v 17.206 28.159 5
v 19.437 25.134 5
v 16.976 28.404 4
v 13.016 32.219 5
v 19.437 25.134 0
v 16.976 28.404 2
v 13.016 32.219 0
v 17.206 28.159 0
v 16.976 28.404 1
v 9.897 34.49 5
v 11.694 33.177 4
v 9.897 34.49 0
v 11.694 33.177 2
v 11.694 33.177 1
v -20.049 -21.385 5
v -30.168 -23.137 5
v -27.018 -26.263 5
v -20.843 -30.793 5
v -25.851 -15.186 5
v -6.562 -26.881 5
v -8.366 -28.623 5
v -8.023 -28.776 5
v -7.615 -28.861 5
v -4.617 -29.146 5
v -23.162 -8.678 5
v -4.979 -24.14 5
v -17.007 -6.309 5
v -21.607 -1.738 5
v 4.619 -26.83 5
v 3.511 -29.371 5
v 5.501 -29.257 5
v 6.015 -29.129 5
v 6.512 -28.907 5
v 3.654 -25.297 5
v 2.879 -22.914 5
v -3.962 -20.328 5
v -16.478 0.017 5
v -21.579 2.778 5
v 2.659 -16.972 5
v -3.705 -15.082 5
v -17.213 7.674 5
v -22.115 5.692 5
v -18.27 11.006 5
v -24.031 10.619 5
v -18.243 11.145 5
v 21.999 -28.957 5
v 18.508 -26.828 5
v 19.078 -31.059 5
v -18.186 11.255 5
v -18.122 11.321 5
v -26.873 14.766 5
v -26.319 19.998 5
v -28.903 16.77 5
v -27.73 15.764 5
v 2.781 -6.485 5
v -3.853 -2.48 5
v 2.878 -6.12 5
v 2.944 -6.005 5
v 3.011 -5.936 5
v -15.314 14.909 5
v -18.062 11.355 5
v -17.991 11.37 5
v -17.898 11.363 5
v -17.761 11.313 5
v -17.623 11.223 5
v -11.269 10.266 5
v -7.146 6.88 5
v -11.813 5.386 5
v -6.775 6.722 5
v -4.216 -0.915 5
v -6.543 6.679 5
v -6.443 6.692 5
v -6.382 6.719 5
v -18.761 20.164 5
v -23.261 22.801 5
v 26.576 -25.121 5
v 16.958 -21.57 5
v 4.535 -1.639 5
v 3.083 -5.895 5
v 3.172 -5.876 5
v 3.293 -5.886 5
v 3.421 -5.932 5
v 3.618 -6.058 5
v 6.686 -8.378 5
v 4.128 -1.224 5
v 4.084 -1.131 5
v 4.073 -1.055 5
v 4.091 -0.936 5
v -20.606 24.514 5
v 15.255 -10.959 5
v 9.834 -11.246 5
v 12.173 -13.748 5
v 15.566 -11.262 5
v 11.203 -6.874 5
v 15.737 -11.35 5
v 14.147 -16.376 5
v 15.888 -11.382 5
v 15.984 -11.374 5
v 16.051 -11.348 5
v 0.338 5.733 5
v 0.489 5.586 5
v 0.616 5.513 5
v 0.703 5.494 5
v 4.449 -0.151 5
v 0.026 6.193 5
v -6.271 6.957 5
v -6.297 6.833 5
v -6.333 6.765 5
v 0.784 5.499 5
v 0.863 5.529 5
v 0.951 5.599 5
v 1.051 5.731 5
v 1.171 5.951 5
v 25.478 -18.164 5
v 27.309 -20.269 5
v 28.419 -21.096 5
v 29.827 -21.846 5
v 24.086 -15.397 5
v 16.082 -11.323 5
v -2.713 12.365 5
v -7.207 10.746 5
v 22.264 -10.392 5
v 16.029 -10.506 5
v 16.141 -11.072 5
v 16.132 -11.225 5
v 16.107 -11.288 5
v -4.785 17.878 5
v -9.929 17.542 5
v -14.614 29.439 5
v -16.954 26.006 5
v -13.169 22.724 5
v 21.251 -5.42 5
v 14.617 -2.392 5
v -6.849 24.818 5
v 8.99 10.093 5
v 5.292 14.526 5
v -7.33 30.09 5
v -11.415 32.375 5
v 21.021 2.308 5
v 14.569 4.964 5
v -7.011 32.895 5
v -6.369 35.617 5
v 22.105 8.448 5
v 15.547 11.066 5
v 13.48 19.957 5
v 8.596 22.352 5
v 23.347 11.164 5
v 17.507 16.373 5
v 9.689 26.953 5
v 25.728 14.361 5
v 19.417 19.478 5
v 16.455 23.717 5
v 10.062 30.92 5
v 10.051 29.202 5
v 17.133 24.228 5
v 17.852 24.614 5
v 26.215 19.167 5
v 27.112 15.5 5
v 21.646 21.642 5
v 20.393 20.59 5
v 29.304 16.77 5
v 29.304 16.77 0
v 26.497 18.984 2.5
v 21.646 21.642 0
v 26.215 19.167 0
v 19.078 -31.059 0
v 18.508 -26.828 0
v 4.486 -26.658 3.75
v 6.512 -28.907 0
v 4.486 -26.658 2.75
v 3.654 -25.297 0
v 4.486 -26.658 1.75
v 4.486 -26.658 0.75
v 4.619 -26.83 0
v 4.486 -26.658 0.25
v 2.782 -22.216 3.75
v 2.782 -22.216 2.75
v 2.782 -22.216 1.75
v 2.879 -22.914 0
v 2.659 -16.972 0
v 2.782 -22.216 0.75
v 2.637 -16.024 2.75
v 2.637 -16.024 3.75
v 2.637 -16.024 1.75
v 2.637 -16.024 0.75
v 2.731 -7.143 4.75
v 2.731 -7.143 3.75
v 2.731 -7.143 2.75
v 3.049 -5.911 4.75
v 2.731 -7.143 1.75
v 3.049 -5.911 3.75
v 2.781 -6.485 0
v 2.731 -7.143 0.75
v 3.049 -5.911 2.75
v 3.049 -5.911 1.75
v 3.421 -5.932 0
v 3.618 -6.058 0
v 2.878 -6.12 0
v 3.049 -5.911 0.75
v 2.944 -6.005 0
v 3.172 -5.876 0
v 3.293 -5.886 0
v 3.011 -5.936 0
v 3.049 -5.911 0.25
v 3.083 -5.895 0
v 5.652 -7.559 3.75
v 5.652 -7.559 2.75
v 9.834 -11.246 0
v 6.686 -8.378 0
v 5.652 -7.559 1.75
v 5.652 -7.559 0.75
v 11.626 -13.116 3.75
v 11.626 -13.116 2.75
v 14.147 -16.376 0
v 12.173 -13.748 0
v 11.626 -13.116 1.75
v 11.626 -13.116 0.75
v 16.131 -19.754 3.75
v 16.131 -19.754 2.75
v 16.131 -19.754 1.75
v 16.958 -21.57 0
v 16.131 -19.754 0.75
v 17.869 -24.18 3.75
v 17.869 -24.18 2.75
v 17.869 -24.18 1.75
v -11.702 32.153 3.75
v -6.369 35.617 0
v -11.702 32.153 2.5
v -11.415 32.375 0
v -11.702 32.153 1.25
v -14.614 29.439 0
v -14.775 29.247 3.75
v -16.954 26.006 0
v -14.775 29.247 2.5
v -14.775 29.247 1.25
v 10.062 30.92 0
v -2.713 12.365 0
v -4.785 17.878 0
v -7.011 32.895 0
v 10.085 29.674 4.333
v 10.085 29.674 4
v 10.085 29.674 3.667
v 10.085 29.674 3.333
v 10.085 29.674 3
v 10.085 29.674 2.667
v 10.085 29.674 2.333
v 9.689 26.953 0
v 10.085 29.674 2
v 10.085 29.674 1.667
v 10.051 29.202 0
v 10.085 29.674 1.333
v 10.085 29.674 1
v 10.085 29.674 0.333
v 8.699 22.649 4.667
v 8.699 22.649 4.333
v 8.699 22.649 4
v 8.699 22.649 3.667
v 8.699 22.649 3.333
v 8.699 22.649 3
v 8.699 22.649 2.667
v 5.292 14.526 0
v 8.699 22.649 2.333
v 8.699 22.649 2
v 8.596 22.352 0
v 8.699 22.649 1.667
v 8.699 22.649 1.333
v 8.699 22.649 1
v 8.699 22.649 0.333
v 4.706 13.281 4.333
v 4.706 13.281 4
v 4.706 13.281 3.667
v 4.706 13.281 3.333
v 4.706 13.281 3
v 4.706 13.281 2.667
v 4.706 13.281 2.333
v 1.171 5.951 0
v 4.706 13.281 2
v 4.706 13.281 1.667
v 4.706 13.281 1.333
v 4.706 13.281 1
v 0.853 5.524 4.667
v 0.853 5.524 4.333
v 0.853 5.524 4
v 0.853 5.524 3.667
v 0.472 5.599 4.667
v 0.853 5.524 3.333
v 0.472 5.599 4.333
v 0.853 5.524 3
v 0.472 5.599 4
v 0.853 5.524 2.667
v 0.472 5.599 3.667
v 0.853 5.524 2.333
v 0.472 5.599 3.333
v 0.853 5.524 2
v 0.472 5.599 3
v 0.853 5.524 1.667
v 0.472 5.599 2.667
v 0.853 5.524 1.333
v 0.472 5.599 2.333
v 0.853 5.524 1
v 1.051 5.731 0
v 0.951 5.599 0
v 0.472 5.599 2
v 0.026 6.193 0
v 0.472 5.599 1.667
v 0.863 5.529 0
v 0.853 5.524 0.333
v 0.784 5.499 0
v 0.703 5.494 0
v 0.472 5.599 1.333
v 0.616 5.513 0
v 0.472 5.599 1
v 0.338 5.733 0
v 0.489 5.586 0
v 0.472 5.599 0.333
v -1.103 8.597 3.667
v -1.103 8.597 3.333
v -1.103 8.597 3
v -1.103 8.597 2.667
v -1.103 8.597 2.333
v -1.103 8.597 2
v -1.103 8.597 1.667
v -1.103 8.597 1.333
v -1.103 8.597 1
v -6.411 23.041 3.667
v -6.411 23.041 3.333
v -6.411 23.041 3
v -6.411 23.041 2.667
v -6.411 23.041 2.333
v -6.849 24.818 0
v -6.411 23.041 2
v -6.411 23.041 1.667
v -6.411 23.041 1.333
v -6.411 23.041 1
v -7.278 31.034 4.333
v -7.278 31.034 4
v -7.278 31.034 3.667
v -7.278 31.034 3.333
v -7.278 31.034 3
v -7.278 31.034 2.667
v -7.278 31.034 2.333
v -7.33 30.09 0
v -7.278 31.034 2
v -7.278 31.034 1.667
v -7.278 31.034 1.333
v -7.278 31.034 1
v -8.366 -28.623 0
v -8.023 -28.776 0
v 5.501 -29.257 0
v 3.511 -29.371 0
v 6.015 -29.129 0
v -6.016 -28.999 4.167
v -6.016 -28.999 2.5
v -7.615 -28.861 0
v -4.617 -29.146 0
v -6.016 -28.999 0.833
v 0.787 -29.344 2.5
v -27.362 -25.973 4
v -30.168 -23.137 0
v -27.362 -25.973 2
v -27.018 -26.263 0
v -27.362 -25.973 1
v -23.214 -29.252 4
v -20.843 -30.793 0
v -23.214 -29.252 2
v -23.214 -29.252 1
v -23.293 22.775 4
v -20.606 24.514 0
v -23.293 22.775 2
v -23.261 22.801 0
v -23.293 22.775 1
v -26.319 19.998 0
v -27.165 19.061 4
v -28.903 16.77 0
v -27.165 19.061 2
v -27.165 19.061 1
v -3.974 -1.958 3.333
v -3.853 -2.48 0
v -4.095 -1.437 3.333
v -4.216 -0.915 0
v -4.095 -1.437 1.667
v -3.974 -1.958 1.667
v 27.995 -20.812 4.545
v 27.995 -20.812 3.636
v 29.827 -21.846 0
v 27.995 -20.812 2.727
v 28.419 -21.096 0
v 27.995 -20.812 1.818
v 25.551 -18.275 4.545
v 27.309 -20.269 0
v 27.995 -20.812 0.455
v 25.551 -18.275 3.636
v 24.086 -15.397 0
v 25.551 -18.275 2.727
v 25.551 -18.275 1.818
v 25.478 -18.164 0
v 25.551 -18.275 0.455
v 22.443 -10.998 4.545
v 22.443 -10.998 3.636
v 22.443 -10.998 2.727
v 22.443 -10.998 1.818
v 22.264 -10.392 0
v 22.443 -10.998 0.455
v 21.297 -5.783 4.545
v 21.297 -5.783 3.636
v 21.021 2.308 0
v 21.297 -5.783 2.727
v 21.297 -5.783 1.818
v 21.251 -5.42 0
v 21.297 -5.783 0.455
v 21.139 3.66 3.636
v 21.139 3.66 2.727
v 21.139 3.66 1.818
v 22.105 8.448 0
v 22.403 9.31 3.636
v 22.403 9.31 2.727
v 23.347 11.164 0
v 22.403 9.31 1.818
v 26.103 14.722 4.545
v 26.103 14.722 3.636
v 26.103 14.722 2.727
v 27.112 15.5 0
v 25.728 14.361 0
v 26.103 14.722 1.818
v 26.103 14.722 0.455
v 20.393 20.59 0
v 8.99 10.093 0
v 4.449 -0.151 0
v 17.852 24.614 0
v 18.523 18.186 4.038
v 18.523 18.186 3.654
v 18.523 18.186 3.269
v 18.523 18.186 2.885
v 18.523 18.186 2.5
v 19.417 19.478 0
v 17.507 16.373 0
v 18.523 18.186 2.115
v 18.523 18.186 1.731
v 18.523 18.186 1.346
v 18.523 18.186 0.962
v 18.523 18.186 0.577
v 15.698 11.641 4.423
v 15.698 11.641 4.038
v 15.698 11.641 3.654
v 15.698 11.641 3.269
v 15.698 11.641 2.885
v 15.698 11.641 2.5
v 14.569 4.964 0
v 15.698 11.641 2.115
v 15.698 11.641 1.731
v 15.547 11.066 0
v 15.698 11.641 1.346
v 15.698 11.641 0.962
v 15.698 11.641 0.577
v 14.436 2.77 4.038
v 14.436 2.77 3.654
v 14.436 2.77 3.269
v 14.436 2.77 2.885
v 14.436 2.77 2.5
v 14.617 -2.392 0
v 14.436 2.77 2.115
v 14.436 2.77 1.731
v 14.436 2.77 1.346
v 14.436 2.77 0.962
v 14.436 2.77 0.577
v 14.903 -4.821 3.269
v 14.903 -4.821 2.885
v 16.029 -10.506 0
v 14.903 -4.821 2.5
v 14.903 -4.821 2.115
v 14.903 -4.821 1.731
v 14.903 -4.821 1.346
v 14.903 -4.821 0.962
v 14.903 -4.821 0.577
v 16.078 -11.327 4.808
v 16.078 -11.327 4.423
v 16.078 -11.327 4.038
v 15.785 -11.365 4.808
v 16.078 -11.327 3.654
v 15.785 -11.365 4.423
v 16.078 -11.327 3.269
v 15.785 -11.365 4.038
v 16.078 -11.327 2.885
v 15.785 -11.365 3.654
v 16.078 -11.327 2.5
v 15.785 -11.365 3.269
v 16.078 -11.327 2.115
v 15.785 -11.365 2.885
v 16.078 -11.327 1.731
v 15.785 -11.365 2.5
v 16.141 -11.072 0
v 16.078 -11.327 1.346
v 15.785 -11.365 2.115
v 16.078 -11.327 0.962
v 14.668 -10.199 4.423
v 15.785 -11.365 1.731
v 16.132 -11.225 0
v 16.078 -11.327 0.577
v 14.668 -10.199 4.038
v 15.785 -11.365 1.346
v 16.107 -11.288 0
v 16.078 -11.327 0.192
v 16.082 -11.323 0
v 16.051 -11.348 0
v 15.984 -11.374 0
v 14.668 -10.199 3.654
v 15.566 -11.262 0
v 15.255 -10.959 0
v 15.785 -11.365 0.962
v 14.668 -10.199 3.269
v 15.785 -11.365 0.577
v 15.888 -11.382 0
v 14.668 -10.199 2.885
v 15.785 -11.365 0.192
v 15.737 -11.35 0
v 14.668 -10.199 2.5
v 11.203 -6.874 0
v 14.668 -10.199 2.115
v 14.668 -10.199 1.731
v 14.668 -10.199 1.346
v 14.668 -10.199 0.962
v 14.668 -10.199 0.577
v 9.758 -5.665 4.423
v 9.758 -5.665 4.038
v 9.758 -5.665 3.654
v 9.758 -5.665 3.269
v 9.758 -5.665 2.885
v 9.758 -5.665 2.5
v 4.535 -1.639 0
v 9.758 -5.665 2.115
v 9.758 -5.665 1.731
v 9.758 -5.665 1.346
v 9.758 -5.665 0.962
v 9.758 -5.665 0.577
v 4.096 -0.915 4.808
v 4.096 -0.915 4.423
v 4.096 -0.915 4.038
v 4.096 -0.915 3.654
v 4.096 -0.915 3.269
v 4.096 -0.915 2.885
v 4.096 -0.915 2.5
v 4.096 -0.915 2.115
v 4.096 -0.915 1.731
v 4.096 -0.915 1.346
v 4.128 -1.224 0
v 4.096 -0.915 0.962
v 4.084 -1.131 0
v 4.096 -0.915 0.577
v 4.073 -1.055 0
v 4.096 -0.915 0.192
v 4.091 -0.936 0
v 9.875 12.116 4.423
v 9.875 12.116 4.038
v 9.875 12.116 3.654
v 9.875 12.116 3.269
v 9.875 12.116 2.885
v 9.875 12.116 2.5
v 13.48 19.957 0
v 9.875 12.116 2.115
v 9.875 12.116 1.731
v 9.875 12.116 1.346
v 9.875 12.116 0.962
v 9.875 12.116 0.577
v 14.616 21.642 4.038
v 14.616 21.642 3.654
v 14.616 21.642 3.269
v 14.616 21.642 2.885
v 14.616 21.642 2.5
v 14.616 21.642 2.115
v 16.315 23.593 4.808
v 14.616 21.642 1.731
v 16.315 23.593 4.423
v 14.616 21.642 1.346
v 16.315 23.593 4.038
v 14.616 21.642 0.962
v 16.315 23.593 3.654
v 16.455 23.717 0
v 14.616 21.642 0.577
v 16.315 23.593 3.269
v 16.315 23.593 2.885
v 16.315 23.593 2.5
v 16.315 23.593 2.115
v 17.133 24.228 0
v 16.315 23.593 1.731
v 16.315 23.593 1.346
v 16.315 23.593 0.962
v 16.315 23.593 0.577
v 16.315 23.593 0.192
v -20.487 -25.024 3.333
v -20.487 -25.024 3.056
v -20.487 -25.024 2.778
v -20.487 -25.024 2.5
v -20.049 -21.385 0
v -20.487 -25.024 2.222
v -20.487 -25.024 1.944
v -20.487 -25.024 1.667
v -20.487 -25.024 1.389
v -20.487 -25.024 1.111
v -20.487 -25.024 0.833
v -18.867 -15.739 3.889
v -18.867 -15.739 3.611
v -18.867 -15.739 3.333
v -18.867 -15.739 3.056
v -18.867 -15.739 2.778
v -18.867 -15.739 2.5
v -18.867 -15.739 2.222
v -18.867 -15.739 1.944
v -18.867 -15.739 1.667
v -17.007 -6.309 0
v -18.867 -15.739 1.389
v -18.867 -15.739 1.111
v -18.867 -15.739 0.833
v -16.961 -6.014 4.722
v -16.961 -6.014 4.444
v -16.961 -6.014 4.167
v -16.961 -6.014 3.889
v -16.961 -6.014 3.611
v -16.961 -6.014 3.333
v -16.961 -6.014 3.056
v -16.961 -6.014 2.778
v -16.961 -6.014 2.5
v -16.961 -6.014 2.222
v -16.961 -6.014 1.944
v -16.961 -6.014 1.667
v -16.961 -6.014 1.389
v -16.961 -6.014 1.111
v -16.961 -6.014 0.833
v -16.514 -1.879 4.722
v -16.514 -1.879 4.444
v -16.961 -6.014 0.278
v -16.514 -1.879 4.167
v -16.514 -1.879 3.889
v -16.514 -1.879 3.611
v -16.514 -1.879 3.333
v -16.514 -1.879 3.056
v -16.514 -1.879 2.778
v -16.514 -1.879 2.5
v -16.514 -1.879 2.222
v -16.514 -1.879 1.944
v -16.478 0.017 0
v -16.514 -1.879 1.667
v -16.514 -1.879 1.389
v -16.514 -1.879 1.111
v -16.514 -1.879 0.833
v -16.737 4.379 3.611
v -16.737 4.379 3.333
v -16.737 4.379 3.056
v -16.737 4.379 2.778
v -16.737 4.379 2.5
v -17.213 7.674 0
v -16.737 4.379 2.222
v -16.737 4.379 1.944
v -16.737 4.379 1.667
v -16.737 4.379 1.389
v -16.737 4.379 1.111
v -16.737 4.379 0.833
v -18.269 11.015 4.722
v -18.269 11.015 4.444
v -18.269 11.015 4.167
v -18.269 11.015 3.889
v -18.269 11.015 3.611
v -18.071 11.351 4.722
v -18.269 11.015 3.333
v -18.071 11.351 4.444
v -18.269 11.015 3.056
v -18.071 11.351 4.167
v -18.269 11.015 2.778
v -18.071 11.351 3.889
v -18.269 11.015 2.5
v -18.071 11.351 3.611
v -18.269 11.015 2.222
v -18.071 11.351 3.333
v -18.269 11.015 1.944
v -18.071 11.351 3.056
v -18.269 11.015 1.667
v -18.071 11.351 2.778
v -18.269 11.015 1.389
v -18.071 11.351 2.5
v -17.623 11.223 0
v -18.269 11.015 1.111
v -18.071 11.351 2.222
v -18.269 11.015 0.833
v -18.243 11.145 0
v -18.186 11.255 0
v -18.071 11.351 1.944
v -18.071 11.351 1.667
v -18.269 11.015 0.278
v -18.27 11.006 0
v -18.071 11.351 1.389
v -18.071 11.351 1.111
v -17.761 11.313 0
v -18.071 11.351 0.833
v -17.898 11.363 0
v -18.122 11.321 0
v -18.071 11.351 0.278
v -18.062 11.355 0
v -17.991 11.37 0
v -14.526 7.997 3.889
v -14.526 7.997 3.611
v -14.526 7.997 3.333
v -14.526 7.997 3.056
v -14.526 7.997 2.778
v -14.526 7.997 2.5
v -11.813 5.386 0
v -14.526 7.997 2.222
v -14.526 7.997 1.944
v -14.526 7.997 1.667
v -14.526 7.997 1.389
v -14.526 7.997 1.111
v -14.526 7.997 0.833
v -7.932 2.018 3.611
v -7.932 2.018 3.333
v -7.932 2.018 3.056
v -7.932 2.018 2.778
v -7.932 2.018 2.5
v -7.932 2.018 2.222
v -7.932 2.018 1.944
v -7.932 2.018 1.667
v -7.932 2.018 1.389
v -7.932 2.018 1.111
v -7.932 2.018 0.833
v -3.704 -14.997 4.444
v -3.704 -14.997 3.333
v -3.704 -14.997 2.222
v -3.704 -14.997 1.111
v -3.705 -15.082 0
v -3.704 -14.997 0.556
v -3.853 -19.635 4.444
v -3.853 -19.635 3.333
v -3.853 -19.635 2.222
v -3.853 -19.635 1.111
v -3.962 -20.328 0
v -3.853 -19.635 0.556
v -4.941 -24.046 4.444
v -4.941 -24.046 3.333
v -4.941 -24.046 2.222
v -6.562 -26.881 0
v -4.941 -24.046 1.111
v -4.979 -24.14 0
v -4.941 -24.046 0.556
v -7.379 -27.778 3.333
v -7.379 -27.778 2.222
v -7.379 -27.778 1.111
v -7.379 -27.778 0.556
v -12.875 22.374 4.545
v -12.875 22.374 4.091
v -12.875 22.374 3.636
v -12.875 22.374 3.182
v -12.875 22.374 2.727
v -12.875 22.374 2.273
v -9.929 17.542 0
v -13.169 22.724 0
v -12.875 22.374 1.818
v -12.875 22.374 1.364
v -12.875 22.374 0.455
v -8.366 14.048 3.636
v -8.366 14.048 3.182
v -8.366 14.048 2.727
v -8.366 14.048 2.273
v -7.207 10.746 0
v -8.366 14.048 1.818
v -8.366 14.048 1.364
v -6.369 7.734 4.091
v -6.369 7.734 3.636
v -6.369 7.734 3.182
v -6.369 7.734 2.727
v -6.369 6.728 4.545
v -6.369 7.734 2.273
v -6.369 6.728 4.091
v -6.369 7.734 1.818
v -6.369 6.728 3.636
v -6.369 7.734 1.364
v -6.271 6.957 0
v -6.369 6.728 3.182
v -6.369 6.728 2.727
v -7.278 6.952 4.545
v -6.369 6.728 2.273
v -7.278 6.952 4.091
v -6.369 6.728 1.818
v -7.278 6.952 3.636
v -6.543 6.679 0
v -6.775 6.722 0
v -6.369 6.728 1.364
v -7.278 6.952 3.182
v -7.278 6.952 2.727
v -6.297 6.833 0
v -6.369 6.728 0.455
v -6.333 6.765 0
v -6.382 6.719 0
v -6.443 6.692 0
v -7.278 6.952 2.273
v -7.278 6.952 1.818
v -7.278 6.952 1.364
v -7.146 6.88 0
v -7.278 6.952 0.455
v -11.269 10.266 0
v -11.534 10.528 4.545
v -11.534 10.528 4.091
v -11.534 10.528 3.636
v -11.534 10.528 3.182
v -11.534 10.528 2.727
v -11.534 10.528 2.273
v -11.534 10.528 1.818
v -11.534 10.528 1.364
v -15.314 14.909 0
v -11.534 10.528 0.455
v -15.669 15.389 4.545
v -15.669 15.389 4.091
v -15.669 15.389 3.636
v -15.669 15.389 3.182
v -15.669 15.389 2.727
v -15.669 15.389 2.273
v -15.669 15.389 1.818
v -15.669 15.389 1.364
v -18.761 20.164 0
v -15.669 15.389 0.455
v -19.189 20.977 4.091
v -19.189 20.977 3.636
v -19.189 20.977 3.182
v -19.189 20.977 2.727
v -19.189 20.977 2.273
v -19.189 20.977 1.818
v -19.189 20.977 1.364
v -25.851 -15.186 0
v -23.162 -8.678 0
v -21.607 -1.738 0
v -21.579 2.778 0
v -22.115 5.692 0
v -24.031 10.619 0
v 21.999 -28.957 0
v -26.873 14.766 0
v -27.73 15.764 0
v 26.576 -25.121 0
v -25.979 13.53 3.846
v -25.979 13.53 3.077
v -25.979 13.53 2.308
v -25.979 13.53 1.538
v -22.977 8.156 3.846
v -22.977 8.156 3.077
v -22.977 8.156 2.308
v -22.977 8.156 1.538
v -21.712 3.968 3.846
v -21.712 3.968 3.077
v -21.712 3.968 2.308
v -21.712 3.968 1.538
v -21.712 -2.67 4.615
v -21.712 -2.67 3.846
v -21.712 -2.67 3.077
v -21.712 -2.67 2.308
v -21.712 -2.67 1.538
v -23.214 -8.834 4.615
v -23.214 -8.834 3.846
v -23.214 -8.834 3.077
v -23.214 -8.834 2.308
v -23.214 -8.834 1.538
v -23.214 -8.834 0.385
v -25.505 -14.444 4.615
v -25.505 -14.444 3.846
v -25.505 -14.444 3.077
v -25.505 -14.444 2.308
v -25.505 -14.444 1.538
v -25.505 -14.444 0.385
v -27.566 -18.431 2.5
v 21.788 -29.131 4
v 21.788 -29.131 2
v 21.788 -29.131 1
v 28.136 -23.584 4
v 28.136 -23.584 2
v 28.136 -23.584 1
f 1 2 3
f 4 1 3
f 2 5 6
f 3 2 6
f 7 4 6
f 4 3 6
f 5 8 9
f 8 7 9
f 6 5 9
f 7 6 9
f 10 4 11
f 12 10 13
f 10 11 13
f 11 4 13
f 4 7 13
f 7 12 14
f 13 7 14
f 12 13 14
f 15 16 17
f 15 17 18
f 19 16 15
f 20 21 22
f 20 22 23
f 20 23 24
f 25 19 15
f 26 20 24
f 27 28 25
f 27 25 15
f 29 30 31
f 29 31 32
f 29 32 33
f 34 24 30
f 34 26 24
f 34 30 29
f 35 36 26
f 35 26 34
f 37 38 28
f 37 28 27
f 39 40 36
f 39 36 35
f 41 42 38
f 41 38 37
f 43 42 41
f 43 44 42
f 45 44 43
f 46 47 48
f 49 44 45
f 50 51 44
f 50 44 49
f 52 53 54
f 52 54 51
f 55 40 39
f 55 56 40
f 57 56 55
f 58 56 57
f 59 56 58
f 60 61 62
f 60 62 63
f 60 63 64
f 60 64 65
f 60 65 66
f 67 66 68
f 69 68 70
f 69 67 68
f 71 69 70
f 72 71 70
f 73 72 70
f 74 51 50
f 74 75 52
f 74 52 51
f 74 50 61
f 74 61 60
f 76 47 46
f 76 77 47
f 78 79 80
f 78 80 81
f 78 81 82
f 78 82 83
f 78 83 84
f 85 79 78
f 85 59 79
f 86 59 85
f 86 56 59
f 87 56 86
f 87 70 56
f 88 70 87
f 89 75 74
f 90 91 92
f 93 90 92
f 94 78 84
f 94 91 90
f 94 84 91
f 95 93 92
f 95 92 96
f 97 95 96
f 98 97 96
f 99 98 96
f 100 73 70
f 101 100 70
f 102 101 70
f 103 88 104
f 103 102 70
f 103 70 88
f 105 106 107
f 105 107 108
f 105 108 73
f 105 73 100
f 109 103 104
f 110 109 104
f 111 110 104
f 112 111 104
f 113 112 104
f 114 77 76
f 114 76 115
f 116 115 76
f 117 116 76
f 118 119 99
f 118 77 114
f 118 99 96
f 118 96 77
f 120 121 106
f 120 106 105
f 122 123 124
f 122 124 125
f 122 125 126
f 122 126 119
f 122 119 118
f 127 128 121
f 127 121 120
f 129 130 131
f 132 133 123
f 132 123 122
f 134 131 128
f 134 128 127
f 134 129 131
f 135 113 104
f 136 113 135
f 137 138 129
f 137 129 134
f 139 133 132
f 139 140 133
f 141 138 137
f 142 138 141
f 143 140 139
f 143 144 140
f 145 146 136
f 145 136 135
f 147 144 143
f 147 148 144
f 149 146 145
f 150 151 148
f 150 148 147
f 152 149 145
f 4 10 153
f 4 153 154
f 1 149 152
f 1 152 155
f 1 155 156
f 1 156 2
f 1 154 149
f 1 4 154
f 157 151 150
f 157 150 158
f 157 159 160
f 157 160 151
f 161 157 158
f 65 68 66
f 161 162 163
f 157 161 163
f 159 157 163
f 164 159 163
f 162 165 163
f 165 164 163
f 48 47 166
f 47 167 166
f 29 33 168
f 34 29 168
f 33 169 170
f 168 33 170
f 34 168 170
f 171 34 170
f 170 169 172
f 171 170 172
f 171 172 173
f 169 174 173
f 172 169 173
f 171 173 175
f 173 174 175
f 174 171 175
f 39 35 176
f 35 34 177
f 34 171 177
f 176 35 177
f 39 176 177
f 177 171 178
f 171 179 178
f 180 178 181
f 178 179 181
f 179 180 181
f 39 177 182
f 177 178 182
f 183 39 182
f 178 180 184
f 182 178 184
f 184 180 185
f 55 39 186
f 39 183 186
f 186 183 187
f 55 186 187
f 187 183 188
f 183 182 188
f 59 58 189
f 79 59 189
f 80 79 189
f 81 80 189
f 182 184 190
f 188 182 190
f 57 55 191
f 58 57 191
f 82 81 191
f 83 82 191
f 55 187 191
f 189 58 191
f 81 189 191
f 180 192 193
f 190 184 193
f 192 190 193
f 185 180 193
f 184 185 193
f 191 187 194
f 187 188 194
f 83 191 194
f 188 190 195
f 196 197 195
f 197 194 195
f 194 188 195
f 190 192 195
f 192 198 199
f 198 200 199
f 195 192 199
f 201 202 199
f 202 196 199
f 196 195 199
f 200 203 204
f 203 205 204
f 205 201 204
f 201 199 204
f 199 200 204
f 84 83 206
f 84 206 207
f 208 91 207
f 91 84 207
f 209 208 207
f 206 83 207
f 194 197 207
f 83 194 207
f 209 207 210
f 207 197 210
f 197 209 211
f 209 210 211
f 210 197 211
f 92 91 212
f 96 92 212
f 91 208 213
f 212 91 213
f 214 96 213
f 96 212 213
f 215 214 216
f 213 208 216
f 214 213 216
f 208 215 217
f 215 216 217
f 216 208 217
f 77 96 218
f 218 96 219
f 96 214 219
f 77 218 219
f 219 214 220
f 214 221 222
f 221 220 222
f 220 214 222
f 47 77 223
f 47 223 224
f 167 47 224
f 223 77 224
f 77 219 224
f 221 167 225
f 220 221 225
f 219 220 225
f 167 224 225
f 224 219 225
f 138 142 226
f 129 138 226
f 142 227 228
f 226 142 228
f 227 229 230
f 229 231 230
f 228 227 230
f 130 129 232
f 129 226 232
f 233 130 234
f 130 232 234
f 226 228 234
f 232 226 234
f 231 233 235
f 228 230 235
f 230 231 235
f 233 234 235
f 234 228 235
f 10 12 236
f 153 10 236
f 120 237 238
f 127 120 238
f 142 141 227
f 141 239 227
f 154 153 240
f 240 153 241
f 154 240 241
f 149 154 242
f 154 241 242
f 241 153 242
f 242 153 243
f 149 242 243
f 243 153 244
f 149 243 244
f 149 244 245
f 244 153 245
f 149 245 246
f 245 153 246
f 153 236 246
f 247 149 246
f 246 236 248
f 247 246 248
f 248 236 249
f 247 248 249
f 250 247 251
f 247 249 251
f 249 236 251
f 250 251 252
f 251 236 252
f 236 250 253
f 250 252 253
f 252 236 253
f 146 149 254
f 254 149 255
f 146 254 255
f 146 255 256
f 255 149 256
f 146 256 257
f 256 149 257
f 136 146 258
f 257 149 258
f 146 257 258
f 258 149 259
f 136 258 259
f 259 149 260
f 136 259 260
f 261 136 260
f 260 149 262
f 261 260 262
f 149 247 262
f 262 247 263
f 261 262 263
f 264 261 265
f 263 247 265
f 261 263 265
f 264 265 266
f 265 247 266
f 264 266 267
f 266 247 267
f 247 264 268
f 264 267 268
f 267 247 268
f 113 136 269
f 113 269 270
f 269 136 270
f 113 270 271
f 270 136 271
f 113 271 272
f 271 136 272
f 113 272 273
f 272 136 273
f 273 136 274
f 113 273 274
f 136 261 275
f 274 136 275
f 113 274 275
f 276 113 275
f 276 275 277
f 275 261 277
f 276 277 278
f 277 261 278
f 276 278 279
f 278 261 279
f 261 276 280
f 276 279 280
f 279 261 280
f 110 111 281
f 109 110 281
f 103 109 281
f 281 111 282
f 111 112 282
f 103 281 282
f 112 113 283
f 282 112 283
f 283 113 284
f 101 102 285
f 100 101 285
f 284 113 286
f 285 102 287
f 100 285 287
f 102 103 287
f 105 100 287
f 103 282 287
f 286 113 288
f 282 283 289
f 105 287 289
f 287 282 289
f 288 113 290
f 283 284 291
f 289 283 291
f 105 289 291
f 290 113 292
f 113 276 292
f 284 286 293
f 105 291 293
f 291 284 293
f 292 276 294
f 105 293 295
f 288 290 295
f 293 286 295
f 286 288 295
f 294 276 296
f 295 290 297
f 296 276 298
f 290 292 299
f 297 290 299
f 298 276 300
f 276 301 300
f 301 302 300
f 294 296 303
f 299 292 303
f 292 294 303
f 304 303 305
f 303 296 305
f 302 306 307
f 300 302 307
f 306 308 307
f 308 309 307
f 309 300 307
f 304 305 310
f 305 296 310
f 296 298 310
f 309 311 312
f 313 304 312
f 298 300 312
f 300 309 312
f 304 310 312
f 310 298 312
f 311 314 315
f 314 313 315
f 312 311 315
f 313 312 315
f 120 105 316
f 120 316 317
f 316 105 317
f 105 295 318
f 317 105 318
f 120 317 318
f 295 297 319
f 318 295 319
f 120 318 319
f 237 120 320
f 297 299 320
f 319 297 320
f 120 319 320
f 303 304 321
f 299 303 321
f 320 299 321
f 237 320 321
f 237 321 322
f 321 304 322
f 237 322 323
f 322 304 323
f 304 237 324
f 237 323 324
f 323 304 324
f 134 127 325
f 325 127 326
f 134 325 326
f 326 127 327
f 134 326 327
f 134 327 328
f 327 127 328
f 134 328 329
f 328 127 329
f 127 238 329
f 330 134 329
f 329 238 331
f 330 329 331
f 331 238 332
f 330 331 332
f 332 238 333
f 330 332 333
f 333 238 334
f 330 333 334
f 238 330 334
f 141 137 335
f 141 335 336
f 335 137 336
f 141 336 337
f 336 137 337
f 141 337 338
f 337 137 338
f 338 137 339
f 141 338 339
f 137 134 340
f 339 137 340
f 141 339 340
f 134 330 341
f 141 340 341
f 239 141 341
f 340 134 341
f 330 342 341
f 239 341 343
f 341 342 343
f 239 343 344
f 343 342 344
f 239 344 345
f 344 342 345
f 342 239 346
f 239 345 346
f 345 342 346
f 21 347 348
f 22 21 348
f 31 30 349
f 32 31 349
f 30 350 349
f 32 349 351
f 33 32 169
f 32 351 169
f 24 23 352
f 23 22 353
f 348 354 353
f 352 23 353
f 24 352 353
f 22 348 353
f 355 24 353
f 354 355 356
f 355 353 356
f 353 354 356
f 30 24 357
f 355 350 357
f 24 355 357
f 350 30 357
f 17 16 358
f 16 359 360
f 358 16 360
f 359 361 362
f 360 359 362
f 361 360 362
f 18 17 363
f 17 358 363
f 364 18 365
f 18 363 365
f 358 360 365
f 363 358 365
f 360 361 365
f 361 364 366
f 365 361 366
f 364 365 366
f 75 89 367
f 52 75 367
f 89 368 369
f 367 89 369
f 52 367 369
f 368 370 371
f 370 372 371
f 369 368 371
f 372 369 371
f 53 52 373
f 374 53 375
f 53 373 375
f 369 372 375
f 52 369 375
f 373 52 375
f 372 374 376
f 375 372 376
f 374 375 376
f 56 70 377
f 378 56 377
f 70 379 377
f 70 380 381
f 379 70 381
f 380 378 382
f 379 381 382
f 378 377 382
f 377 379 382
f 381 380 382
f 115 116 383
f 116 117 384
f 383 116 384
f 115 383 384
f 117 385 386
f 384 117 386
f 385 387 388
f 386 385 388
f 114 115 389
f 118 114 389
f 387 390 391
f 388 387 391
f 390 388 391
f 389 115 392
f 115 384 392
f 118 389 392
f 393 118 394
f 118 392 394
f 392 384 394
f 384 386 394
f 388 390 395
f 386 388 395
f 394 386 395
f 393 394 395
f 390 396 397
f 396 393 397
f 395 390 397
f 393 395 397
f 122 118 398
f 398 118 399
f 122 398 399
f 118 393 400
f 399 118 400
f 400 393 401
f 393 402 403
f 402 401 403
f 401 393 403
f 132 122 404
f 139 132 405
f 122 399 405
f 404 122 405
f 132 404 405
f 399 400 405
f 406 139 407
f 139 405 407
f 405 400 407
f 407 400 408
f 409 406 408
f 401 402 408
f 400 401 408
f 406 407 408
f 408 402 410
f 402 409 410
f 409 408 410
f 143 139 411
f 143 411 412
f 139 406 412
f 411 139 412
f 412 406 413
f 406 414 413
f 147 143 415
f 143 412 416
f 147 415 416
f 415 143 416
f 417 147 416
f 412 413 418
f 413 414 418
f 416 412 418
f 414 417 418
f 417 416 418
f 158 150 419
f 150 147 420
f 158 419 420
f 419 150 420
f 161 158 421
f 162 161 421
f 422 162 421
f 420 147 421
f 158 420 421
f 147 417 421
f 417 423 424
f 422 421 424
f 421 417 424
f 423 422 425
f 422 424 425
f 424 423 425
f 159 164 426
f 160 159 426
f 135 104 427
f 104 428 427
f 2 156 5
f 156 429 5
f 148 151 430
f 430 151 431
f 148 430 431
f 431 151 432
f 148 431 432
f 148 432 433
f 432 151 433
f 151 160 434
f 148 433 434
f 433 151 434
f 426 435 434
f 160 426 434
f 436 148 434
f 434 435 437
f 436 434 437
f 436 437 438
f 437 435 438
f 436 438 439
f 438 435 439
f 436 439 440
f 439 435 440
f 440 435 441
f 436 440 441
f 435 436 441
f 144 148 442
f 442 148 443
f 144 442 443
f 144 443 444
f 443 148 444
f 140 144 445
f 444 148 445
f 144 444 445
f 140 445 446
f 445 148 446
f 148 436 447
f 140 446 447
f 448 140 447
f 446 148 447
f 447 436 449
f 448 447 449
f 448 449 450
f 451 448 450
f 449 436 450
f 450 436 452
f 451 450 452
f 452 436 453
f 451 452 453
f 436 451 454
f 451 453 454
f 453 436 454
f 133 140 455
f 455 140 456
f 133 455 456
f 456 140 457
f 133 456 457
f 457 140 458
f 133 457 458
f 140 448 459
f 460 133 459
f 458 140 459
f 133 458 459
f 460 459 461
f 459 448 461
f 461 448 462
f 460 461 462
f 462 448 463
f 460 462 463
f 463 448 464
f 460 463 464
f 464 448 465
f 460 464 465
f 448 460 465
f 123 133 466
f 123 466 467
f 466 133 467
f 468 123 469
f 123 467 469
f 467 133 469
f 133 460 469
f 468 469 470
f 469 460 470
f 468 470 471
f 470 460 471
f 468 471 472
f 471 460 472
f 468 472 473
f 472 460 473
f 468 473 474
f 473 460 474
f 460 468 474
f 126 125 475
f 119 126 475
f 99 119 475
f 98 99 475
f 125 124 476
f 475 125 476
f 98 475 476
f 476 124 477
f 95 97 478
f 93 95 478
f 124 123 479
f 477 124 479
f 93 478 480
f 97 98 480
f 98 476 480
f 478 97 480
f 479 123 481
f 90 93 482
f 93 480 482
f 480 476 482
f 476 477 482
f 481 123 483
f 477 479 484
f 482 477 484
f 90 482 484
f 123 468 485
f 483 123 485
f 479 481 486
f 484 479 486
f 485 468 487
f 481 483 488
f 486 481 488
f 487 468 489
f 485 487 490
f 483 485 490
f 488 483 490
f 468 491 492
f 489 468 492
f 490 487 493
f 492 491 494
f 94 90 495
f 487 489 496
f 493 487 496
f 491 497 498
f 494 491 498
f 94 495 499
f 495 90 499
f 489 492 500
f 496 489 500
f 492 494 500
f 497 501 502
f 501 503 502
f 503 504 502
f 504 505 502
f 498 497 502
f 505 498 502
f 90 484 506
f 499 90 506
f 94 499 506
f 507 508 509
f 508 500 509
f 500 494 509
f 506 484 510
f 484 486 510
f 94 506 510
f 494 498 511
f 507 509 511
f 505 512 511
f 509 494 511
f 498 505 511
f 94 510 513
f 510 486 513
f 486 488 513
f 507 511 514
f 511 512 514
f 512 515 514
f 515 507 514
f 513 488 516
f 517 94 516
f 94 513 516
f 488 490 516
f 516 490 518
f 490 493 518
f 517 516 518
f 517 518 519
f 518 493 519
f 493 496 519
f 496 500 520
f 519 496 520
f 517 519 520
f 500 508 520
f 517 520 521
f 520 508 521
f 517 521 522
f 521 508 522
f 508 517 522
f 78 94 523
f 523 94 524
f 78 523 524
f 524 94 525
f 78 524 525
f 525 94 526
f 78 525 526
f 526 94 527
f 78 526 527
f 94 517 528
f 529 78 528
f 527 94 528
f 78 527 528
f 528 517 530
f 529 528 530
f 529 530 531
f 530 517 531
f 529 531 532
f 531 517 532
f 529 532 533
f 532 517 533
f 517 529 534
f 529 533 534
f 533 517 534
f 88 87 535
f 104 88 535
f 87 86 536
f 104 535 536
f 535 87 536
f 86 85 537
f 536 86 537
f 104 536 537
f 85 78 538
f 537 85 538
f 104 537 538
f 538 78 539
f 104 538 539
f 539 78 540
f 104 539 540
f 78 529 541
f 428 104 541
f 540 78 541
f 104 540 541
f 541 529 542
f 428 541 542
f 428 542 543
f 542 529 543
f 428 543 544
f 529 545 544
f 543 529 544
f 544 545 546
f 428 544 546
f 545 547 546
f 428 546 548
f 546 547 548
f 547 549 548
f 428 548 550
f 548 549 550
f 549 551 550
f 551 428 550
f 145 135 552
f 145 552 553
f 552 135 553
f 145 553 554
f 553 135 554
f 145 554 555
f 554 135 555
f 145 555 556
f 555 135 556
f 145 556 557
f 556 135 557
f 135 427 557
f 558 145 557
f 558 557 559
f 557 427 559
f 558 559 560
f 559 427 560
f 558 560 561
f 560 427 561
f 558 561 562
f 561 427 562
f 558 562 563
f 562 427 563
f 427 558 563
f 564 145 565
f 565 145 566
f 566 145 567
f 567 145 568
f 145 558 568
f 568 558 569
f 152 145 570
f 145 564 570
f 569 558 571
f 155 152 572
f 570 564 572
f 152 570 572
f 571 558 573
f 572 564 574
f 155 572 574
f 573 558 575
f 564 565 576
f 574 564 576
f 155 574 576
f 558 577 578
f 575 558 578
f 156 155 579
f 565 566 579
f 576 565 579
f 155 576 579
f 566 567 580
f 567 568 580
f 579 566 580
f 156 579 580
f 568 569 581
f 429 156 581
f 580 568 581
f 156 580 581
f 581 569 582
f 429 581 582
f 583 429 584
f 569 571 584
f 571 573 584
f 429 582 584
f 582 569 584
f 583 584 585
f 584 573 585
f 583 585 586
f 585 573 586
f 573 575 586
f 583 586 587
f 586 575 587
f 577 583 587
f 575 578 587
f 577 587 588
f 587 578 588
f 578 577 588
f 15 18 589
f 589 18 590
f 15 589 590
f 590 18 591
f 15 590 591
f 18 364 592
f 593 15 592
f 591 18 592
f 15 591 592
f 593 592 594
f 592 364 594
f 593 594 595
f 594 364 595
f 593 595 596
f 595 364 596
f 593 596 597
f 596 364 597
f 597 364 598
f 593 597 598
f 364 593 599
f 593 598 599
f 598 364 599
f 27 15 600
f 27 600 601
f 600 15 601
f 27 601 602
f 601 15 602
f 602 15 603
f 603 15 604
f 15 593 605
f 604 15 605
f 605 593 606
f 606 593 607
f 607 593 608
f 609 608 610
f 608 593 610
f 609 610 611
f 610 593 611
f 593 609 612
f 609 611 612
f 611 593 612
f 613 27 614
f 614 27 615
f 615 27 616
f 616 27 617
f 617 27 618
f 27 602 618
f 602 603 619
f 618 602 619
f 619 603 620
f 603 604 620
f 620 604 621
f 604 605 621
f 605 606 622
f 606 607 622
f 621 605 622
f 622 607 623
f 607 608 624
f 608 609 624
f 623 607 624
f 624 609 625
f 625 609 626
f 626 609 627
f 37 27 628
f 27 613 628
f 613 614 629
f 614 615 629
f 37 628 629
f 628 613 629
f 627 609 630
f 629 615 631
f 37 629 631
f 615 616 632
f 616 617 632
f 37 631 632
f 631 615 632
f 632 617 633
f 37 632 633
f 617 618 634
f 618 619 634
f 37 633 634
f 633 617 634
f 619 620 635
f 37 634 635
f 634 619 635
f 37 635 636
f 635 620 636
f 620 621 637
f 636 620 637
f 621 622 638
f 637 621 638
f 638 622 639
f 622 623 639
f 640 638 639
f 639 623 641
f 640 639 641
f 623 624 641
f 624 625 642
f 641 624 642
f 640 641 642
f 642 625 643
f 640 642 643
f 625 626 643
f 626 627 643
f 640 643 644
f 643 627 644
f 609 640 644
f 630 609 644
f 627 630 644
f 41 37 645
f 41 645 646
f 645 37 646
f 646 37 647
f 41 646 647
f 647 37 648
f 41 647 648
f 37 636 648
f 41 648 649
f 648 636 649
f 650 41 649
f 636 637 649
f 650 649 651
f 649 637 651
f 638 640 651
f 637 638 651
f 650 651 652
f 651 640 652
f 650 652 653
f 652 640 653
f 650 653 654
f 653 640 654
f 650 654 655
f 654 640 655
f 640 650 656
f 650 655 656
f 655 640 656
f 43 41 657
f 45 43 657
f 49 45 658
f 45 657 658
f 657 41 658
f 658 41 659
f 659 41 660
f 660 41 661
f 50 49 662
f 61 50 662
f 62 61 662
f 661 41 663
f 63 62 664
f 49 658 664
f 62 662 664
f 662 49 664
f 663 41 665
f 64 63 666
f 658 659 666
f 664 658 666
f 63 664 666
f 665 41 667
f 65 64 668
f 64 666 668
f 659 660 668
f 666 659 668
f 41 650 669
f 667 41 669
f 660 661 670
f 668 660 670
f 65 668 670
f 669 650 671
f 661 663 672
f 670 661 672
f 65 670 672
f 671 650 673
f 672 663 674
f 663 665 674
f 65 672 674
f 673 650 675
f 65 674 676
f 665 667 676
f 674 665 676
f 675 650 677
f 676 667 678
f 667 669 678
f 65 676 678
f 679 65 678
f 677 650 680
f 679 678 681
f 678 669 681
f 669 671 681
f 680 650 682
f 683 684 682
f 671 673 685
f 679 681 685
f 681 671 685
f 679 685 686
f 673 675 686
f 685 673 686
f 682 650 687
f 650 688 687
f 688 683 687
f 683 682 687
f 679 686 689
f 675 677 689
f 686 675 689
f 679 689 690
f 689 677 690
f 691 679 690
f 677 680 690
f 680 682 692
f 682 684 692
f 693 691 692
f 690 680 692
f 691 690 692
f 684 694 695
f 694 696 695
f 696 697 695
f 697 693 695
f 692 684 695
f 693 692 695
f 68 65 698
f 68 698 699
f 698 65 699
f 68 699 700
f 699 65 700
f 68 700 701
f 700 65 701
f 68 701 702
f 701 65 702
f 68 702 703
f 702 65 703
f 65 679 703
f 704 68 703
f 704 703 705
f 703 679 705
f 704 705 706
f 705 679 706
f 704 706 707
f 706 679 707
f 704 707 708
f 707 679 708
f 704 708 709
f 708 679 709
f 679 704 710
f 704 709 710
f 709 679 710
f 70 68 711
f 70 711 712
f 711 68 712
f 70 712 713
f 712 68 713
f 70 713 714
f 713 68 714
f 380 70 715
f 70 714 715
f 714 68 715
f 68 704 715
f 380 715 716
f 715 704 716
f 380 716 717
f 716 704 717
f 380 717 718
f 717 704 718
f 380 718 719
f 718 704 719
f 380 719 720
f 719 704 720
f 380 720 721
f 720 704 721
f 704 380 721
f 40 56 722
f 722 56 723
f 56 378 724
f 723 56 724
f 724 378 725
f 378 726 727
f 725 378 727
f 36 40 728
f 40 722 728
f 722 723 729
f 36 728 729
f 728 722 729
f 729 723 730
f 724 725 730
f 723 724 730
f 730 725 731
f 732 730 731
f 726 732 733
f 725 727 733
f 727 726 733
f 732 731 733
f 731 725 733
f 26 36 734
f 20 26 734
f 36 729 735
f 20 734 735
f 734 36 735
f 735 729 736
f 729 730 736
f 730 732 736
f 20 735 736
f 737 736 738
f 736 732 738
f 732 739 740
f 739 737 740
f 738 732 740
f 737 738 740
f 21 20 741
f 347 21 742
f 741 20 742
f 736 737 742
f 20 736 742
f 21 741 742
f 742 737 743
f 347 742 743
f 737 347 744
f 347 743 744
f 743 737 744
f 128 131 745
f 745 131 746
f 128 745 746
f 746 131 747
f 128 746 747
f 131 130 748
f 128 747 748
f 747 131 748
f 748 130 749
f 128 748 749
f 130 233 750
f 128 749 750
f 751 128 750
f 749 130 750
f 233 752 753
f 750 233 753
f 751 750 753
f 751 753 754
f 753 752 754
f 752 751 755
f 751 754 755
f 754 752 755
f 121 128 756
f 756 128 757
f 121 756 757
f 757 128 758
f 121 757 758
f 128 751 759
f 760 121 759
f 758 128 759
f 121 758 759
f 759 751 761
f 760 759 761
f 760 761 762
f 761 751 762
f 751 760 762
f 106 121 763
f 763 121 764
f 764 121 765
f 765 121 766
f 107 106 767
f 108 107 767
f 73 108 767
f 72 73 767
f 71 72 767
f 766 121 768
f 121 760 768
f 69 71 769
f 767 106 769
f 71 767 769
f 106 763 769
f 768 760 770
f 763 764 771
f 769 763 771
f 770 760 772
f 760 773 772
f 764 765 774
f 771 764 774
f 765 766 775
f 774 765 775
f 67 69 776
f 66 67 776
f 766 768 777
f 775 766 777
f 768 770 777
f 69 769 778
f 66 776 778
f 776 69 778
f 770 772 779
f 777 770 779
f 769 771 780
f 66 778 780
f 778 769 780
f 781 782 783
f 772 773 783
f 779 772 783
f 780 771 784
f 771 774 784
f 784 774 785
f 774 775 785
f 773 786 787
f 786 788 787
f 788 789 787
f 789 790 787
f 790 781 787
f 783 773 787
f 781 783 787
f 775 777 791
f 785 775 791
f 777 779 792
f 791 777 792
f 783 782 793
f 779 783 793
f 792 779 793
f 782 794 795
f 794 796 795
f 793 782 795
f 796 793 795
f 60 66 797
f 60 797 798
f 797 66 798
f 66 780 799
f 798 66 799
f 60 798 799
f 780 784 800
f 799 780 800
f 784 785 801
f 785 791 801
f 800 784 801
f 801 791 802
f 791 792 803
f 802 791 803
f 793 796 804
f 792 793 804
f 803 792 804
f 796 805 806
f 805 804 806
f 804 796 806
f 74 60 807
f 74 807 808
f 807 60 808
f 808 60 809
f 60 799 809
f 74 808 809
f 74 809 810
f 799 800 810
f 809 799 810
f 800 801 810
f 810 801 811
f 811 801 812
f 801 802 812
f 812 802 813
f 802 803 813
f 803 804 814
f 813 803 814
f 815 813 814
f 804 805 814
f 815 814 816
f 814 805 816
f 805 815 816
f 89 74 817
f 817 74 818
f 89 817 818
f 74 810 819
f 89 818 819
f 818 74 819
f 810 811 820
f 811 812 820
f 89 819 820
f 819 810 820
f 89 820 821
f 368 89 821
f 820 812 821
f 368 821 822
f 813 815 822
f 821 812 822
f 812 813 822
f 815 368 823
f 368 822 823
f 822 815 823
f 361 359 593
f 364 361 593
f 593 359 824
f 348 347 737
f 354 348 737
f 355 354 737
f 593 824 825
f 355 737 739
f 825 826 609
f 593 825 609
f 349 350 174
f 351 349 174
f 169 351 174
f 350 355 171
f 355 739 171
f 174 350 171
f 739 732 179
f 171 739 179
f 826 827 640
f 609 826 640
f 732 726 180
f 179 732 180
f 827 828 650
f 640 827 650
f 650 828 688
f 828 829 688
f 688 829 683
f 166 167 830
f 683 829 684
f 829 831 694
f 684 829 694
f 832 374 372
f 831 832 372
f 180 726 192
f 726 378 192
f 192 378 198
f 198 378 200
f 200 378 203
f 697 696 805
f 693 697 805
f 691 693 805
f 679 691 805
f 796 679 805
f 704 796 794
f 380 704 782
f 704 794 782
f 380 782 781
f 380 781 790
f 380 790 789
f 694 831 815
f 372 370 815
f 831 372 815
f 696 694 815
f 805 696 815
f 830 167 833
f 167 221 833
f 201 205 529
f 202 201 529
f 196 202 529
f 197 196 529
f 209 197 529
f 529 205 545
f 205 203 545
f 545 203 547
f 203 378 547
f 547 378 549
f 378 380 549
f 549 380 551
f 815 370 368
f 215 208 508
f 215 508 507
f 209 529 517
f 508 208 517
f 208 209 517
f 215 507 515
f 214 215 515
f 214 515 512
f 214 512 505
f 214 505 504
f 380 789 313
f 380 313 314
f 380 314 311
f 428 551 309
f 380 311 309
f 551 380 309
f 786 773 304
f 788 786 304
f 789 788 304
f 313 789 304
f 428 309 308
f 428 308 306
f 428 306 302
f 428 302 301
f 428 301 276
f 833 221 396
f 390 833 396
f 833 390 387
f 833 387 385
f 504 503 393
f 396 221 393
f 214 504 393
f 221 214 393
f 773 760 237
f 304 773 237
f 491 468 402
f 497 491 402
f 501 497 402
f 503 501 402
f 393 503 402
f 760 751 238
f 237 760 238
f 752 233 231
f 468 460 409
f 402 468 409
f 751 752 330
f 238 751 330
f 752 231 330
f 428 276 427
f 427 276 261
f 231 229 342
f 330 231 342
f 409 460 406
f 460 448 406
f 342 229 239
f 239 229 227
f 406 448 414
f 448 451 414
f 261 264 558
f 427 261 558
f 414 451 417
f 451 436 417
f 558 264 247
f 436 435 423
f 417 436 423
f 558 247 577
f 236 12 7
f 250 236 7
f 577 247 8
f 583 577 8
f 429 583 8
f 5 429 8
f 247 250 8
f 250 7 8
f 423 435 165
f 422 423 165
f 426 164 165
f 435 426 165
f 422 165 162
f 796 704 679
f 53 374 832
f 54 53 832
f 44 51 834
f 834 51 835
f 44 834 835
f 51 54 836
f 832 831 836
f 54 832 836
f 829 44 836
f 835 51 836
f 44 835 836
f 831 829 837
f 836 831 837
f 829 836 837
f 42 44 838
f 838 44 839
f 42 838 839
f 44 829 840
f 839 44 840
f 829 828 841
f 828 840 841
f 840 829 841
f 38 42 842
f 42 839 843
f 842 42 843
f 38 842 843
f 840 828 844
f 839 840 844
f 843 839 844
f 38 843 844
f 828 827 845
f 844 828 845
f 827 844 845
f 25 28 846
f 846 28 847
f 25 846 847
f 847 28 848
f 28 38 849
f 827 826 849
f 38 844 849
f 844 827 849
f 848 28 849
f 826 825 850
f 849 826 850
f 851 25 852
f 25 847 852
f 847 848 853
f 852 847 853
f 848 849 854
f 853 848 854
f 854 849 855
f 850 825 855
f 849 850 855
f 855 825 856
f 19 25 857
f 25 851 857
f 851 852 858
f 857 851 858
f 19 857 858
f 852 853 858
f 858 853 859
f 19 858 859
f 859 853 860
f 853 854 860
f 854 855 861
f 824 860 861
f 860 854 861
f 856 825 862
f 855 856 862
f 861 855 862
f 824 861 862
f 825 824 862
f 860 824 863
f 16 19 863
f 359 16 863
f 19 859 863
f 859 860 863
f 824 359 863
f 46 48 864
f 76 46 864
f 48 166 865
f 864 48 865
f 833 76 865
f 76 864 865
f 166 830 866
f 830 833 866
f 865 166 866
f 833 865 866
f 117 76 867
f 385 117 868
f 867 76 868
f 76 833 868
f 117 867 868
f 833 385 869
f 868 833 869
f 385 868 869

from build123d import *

# Parameters (mm, degrees)
F1_DEPTH = 5


with BuildPart() as f1:
    # F0 (on Top) → F1 (new body)
    with BuildSketch(Plane.XY):
        with BuildLine():
            add(Edge.make_bspline(
                [(-16.9540923089, 26.0060671717), (-16.3511230393, 25.5733798215), (-15.0433309525, 24.6349155891), (-12.7008415677, 22.4022869564), (-10.6785391417, 19.0748451145), (-8.2707036345, 14.3391207907), (-6.3456003558, 8.072731127), (-6.1807407285, 6.5168361351), (-7.6326742263, 6.9320568412), (-11.9187464421, 10.6806278928), (-15.6673615052, 15.1638714016), (-19.3440121934, 20.8198978447), (-20.2254168498, 23.4000240735), (-20.6058900803, 24.5137792081)],
                knots=[0, 0, 0, 0, 0.0704721761, 0.1528485097, 0.24313618, 0.3536715094, 0.4729052727, 0.5193729812, 0.5641957054, 0.6734394303, 0.7904906696, 0.9095617533, 1, 1, 1, 1], degree=3))
            add(Edge.make_bspline(
                [(-20.6058900803, 24.5137792081), (-20.9984075017, 24.3208357432), (-21.8534102199, 23.9005558323), (-23.3422257738, 22.7764968274), (-25.4749454139, 20.8725148996), (-27.2099175288, 19.1112337363), (-28.3263010345, 17.5674125666), (-28.9032198489, 16.7696047574)],
                knots=[0, 0, 0, 0, 0.1546177393, 0.3367967386, 0.5621881858, 0.7737499063, 1, 1, 1, 1], degree=3))
            add(Edge.make_bspline(
                [(-28.9032198489, 16.7696047574), (-28.4167637448, 16.3821123798), (-27.3748435523, 15.5521584965), (-25.9853525682, 13.4857071877), (-24.0858097794, 11.0214502132), (-22.9599147209, 8.1364474118), (-21.4302425376, 4.0508996574), (-21.5780157799, -0.0184756718), (-21.5533729185, -2.6076122576), (-22.6289511451, -6.5224370805), (-23.1019636695, -8.7993134186), (-24.4991970899, -11.9976720461), (-25.4922368647, -14.5071460666), (-26.7413396131, -16.964544153), (-28.8528792116, -20.7682949806), (-30.1675740629, -23.136600852)],
                knots=[0, 0, 0, 0, 0.058656633, 0.1256342141, 0.2001177811, 0.2751388353, 0.3640728234, 0.4488041761, 0.5183400932, 0.6022161716, 0.6688169664, 0.7472690876, 0.8165685305, 0.8857911977, 1, 1, 1, 1], degree=3))
            add(Edge.make_bspline(
                [(-30.1675740629, -23.136600852), (-29.7526695516, -23.5765928594), (-28.8889237136, -24.4925657031), (-27.3905725441, -26.0390443697), (-25.2281186427, -27.6205166371), (-23.254912202, -29.3090877319), (-21.6572692529, -30.2919914435), (-20.8429563791, -30.7929739356)],
                knots=[0, 0, 0, 0, 0.174810285, 0.3639190512, 0.5746634084, 0.7832074667, 1, 1, 1, 1], degree=3))
            add(Edge.make_bspline(
                [(-20.8429563791, -30.7929739356), (-20.8608619967, -30.2026600864), (-20.9040144903, -28.780005192), (-20.4673640558, -24.9118219361), (-20.0249361056, -20.5636330115), (-18.8424666176, -15.8424202871), (-17.5077953424, -9.2288872815), (-16.9443379138, -6.0586745202), (-16.3578009455, -1.7230713785), (-16.5712067047, 4.1140341944), (-17.451894525, 9.3356936382), (-18.0570964916, 10.2962510904), (-18.3593971501, 10.9891843832), (-18.1045081767, 11.4388810616), (-17.5784697208, 11.2892805661), (-16.8522231139, 10.2860159415), (-14.4177548761, 7.8871415421), (-11.332708812, 4.8752153132), (-7.9480140998, 1.9865204894), (-5.4725607549, 0.0617751182), (-4.2162085883, -0.915079494)],
                knots=[0, 0, 0, 0, 0.0444612009, 0.1071513826, 0.1740356652, 0.2458628754, 0.3283032526, 0.3859517273, 0.4511172583, 0.5310800514, 0.603297169, 0.6362072474, 0.6623955705, 0.682302977, 0.7025128392, 0.7367274211, 0.7956317135, 0.8630089022, 0.9304737199, 1, 1, 1, 1], degree=3))
            add(Edge.make_bspline(
                [(-4.2162085883, -0.915079494), (-4.0951416207, -1.4365992974), (-3.974074653, -1.9581191009), (-3.8530076854, -2.4796389043)],
                knots=[0, 0, 0, 0, 1.606163455, 1.606163455, 1.606163455, 1.606163455], degree=3))
            add(Edge.make_bspline(
                [(-3.8530076854, -2.4796389043), (-3.7668142537, -4.1972385712), (-3.5846624986, -7.8270255225), (-3.7115976376, -14.9531654808), (-3.7193442105, -16.8690669633), (-3.7209025298, -19.641058974), (-4.4882599216, -22.6348628696), (-4.8736277246, -24.0320824613), (-5.9905320299, -26.2717215879), (-7.3160472685, -27.7819828501), (-8.0430987186, -28.3647882461), (-8.3656087518, -28.6233127117)],
                knots=[0, 0, 0, 0, 0.1562424765, 0.3301857315, 0.4222726096, 0.5308364905, 0.6464186979, 0.7270291353, 0.8301854294, 0.9246725899, 1, 1, 1, 1], degree=3))
            add(Edge.make_bspline(
                [(-8.3656087518, -28.6233127117), (-8.2376425098, -28.6921783826), (-7.8624516529, -28.8940892122), (-5.8634395314, -28.9686960986), (-3.1841422009, -29.3620784814), (0.624437919, -29.3040170472), (5.4394630546, -29.4572669167), (6.2505673108, -29.0409865673), (6.5117557533, -28.9069376886)],
                knots=[0, 0, 0, 0, 0.0793530414, 0.2326592947, 0.4174146878, 0.64256558, 0.8849004444, 1, 1, 1, 1], degree=3))
            add(Edge.make_bspline(
                [(6.5117557533, -28.9069376886), (6.2171684789, -28.586380618), (5.5908053875, -27.9047995207), (4.3972424997, -26.6808020589), (3.2346474712, -24.6493113918), (2.6768520748, -22.1920806785), (2.7641166538, -19.7750332626), (2.5987015649, -15.9439261133), (2.61282183, -10.714107184), (2.7145787514, -7.2825956545), (2.7791947808, -6.2682723338), (3.0128803855, -5.8513231307), (3.4692855858, -5.8743572388), (4.114993975, -6.5485628585), (5.800158763, -7.557852709), (8.847524943, -10.2450768972), (11.6760774507, -13.0529128592), (13.9915779669, -16.0101483413), (16.2684430531, -19.7455042265), (17.9874529522, -24.0444010407), (18.8675957667, -28.5426658386), (19.0151570383, -30.3106885244), (19.0776325762, -31.0592465103)],
                knots=[0, 0, 0, 0, 0.0365075982, 0.0776238964, 0.1258893661, 0.1755588616, 0.2241245056, 0.2859900152, 0.3600902024, 0.4182303687, 0.4485731173, 0.4680851946, 0.4868514382, 0.5159173203, 0.5599119953, 0.6238713269, 0.6876316502, 0.7485447529, 0.8142559234, 0.8831671174, 0.9505344654, 1, 1, 1, 1], degree=3))
            add(Edge.make_bspline(
                [(19.0776325762, -31.0592465103), (19.6449301565, -30.7266107407), (20.7217103165, -30.095239112), (21.7886128552, -29.0703026401), (25.5030553474, -26.2281835005), (28.0726021538, -23.6604071121), (29.2882331294, -22.403134669), (29.8272483051, -21.8456555158)],
                knots=[0, 0, 0, 0, 0.164869144, 0.3129359783, 0.5736618494, 0.8109601205, 1, 1, 1, 1], degree=3))
            add(Edge.make_bspline(
                [(29.8272483051, -21.8456555158), (29.2304425005, -21.5568933805), (27.861421062, -20.8944977555), (25.2765082657, -18.3859855777), (23.6460992144, -14.3171184518), (22.3419088894, -11.0223077299), (21.1063413546, -5.7840674377), (20.9584556966, -0.5243779479), (20.9621308249, 3.5539270397), (22.1330766707, 9.4308016115), (23.9432319987, 12.0548095227), (25.942423621, 14.967273527), (28.160454988, 16.1566313757), (29.3035879731, 16.7696047574)],
                knots=[0, 0, 0, 0, 0.0661128104, 0.1516571289, 0.2464927025, 0.3328920459, 0.4382174902, 0.5424044739, 0.6361546167, 0.7458280966, 0.8276155581, 0.9111561971, 1, 1, 1, 1], degree=3))
            add(Edge.make_bspline(
                [(29.3035879731, 16.7696047574), (28.4490735489, 17.5133972629), (26.5316841963, 19.1823449015), (23.3882366532, 20.7646330785), (21.6457154602, 21.6417498887)],
                knots=[0, 0, 0, 0, 0.4456655729, 1, 1, 1, 1], degree=3))
            add(Edge.make_bspline(
                [(21.6457154602, 21.6417498887), (21.157595854, 21.2636571561), (20.0869508638, 20.4343458871), (18.4219514334, 18.1597650806), (17.0097700829, 15.4857701657), (15.5517177107, 11.6243429828), (14.7361243193, 7.0865081837), (14.3621268959, 2.8086032883), (14.4605970945, -0.9634049906), (14.8332846725, -4.7103296309), (15.6053889983, -9.1825534969), (16.1075369777, -10.6805274491), (16.1935665921, -11.424396943), (15.4610967528, -11.3740291706), (14.6892948734, -10.0264017341), (12.1327670509, -7.6839208188), (9.8641147156, -5.6851175248), (5.8099246048, -2.6113481669), (4.092243424, -1.3380509082), (4.0298929794, -0.8463987053), (5.2521625639, 1.184051044), (7.0013966984, 5.803612562), (9.9219166301, 12.009726219), (12.3372816461, 18.2441759393), (14.4804903194, 21.5713883933), (16.2150887513, 23.6320304369), (17.7241610232, 24.6611468707), (18.8666700679, 24.9766686091), (19.4366965443, 25.1340903342)],
                knots=[0, 0, 0, 0, 0.0315563059, 0.0692158242, 0.1088487362, 0.1548172791, 0.2038939632, 0.2509850274, 0.2945754209, 0.3395671965, 0.3879059504, 0.4164318916, 0.4327637194, 0.4479438939, 0.4754283378, 0.5173290626, 0.5584632394, 0.6103352318, 0.64184228, 0.6550055068, 0.687643723, 0.7387904351, 0.7993593921, 0.8583124426, 0.9032892471, 0.9398113737, 0.9699703817, 1, 1, 1, 1], degree=3))
            add(Edge.make_bspline(
                [(19.4366965443, 25.1340903342), (19.1042413619, 25.6782921671), (18.4094169278, 26.8156627079), (17.0287224434, 28.4060246037), (13.3853832477, 32.0629760319), (11.748264275, 33.1125589849), (10.5219442723, 34.0246161992), (9.8966658115, 34.4896577299)],
                knots=[0, 0, 0, 0, 0.1702887309, 0.3558999147, 0.6361065248, 0.8144572774, 1, 1, 1, 1], degree=3))
            add(Edge.make_bspline(
                [(9.8966658115, 34.4896577299), (9.8714333213, 33.8771217362), (9.8149487084, 32.5059190486), (10.3536822079, 29.6712702344), (9.2851958959, 25.2866825076), (8.96644341, 22.7925286251), (5.7108997186, 15.4725524525), (4.9088721758, 13.6369670983), (1.4680076111, 6.6983085731), (0.9699526563, 5.4416069685), (0.2231585936, 5.5266647154), (-1.3125581132, 9.0985052821), (-3.7851550386, 14.7188782717), (-6.5082353795, 22.9862773115), (-7.2015095695, 26.4606471476), (-7.5211122041, 31.1377246817), (-6.7563469116, 34.1117829076), (-6.3692266122, 35.617236048)],
                knots=[0, 0, 0, 0, 0.0471715026, 0.1055965557, 0.1762073989, 0.2344432956, 0.3275897944, 0.3844488717, 0.4780941371, 0.5149932458, 0.5366206615, 0.5994326723, 0.6888279778, 0.788900255, 0.853976976, 0.9260838883, 1, 1, 1, 1], degree=3))
            add(Edge.make_bspline(
                [(-6.3692266122, 35.617236048), (-6.9937207306, 35.283647087), (-8.4505798486, 34.5054297988), (-11.8138540455, 32.1822129063), (-14.9154814751, 29.3910000231), (-16.2836393731, 27.1192949295), (-16.9540923089, 26.0060671717)],
                knots=[0, 0, 0, 0, 0.2001543283, 0.4669325931, 0.7387753209, 1, 1, 1, 1], degree=3))
        make_face()
    extrude(amount=F1_DEPTH)


solid = f1.part
